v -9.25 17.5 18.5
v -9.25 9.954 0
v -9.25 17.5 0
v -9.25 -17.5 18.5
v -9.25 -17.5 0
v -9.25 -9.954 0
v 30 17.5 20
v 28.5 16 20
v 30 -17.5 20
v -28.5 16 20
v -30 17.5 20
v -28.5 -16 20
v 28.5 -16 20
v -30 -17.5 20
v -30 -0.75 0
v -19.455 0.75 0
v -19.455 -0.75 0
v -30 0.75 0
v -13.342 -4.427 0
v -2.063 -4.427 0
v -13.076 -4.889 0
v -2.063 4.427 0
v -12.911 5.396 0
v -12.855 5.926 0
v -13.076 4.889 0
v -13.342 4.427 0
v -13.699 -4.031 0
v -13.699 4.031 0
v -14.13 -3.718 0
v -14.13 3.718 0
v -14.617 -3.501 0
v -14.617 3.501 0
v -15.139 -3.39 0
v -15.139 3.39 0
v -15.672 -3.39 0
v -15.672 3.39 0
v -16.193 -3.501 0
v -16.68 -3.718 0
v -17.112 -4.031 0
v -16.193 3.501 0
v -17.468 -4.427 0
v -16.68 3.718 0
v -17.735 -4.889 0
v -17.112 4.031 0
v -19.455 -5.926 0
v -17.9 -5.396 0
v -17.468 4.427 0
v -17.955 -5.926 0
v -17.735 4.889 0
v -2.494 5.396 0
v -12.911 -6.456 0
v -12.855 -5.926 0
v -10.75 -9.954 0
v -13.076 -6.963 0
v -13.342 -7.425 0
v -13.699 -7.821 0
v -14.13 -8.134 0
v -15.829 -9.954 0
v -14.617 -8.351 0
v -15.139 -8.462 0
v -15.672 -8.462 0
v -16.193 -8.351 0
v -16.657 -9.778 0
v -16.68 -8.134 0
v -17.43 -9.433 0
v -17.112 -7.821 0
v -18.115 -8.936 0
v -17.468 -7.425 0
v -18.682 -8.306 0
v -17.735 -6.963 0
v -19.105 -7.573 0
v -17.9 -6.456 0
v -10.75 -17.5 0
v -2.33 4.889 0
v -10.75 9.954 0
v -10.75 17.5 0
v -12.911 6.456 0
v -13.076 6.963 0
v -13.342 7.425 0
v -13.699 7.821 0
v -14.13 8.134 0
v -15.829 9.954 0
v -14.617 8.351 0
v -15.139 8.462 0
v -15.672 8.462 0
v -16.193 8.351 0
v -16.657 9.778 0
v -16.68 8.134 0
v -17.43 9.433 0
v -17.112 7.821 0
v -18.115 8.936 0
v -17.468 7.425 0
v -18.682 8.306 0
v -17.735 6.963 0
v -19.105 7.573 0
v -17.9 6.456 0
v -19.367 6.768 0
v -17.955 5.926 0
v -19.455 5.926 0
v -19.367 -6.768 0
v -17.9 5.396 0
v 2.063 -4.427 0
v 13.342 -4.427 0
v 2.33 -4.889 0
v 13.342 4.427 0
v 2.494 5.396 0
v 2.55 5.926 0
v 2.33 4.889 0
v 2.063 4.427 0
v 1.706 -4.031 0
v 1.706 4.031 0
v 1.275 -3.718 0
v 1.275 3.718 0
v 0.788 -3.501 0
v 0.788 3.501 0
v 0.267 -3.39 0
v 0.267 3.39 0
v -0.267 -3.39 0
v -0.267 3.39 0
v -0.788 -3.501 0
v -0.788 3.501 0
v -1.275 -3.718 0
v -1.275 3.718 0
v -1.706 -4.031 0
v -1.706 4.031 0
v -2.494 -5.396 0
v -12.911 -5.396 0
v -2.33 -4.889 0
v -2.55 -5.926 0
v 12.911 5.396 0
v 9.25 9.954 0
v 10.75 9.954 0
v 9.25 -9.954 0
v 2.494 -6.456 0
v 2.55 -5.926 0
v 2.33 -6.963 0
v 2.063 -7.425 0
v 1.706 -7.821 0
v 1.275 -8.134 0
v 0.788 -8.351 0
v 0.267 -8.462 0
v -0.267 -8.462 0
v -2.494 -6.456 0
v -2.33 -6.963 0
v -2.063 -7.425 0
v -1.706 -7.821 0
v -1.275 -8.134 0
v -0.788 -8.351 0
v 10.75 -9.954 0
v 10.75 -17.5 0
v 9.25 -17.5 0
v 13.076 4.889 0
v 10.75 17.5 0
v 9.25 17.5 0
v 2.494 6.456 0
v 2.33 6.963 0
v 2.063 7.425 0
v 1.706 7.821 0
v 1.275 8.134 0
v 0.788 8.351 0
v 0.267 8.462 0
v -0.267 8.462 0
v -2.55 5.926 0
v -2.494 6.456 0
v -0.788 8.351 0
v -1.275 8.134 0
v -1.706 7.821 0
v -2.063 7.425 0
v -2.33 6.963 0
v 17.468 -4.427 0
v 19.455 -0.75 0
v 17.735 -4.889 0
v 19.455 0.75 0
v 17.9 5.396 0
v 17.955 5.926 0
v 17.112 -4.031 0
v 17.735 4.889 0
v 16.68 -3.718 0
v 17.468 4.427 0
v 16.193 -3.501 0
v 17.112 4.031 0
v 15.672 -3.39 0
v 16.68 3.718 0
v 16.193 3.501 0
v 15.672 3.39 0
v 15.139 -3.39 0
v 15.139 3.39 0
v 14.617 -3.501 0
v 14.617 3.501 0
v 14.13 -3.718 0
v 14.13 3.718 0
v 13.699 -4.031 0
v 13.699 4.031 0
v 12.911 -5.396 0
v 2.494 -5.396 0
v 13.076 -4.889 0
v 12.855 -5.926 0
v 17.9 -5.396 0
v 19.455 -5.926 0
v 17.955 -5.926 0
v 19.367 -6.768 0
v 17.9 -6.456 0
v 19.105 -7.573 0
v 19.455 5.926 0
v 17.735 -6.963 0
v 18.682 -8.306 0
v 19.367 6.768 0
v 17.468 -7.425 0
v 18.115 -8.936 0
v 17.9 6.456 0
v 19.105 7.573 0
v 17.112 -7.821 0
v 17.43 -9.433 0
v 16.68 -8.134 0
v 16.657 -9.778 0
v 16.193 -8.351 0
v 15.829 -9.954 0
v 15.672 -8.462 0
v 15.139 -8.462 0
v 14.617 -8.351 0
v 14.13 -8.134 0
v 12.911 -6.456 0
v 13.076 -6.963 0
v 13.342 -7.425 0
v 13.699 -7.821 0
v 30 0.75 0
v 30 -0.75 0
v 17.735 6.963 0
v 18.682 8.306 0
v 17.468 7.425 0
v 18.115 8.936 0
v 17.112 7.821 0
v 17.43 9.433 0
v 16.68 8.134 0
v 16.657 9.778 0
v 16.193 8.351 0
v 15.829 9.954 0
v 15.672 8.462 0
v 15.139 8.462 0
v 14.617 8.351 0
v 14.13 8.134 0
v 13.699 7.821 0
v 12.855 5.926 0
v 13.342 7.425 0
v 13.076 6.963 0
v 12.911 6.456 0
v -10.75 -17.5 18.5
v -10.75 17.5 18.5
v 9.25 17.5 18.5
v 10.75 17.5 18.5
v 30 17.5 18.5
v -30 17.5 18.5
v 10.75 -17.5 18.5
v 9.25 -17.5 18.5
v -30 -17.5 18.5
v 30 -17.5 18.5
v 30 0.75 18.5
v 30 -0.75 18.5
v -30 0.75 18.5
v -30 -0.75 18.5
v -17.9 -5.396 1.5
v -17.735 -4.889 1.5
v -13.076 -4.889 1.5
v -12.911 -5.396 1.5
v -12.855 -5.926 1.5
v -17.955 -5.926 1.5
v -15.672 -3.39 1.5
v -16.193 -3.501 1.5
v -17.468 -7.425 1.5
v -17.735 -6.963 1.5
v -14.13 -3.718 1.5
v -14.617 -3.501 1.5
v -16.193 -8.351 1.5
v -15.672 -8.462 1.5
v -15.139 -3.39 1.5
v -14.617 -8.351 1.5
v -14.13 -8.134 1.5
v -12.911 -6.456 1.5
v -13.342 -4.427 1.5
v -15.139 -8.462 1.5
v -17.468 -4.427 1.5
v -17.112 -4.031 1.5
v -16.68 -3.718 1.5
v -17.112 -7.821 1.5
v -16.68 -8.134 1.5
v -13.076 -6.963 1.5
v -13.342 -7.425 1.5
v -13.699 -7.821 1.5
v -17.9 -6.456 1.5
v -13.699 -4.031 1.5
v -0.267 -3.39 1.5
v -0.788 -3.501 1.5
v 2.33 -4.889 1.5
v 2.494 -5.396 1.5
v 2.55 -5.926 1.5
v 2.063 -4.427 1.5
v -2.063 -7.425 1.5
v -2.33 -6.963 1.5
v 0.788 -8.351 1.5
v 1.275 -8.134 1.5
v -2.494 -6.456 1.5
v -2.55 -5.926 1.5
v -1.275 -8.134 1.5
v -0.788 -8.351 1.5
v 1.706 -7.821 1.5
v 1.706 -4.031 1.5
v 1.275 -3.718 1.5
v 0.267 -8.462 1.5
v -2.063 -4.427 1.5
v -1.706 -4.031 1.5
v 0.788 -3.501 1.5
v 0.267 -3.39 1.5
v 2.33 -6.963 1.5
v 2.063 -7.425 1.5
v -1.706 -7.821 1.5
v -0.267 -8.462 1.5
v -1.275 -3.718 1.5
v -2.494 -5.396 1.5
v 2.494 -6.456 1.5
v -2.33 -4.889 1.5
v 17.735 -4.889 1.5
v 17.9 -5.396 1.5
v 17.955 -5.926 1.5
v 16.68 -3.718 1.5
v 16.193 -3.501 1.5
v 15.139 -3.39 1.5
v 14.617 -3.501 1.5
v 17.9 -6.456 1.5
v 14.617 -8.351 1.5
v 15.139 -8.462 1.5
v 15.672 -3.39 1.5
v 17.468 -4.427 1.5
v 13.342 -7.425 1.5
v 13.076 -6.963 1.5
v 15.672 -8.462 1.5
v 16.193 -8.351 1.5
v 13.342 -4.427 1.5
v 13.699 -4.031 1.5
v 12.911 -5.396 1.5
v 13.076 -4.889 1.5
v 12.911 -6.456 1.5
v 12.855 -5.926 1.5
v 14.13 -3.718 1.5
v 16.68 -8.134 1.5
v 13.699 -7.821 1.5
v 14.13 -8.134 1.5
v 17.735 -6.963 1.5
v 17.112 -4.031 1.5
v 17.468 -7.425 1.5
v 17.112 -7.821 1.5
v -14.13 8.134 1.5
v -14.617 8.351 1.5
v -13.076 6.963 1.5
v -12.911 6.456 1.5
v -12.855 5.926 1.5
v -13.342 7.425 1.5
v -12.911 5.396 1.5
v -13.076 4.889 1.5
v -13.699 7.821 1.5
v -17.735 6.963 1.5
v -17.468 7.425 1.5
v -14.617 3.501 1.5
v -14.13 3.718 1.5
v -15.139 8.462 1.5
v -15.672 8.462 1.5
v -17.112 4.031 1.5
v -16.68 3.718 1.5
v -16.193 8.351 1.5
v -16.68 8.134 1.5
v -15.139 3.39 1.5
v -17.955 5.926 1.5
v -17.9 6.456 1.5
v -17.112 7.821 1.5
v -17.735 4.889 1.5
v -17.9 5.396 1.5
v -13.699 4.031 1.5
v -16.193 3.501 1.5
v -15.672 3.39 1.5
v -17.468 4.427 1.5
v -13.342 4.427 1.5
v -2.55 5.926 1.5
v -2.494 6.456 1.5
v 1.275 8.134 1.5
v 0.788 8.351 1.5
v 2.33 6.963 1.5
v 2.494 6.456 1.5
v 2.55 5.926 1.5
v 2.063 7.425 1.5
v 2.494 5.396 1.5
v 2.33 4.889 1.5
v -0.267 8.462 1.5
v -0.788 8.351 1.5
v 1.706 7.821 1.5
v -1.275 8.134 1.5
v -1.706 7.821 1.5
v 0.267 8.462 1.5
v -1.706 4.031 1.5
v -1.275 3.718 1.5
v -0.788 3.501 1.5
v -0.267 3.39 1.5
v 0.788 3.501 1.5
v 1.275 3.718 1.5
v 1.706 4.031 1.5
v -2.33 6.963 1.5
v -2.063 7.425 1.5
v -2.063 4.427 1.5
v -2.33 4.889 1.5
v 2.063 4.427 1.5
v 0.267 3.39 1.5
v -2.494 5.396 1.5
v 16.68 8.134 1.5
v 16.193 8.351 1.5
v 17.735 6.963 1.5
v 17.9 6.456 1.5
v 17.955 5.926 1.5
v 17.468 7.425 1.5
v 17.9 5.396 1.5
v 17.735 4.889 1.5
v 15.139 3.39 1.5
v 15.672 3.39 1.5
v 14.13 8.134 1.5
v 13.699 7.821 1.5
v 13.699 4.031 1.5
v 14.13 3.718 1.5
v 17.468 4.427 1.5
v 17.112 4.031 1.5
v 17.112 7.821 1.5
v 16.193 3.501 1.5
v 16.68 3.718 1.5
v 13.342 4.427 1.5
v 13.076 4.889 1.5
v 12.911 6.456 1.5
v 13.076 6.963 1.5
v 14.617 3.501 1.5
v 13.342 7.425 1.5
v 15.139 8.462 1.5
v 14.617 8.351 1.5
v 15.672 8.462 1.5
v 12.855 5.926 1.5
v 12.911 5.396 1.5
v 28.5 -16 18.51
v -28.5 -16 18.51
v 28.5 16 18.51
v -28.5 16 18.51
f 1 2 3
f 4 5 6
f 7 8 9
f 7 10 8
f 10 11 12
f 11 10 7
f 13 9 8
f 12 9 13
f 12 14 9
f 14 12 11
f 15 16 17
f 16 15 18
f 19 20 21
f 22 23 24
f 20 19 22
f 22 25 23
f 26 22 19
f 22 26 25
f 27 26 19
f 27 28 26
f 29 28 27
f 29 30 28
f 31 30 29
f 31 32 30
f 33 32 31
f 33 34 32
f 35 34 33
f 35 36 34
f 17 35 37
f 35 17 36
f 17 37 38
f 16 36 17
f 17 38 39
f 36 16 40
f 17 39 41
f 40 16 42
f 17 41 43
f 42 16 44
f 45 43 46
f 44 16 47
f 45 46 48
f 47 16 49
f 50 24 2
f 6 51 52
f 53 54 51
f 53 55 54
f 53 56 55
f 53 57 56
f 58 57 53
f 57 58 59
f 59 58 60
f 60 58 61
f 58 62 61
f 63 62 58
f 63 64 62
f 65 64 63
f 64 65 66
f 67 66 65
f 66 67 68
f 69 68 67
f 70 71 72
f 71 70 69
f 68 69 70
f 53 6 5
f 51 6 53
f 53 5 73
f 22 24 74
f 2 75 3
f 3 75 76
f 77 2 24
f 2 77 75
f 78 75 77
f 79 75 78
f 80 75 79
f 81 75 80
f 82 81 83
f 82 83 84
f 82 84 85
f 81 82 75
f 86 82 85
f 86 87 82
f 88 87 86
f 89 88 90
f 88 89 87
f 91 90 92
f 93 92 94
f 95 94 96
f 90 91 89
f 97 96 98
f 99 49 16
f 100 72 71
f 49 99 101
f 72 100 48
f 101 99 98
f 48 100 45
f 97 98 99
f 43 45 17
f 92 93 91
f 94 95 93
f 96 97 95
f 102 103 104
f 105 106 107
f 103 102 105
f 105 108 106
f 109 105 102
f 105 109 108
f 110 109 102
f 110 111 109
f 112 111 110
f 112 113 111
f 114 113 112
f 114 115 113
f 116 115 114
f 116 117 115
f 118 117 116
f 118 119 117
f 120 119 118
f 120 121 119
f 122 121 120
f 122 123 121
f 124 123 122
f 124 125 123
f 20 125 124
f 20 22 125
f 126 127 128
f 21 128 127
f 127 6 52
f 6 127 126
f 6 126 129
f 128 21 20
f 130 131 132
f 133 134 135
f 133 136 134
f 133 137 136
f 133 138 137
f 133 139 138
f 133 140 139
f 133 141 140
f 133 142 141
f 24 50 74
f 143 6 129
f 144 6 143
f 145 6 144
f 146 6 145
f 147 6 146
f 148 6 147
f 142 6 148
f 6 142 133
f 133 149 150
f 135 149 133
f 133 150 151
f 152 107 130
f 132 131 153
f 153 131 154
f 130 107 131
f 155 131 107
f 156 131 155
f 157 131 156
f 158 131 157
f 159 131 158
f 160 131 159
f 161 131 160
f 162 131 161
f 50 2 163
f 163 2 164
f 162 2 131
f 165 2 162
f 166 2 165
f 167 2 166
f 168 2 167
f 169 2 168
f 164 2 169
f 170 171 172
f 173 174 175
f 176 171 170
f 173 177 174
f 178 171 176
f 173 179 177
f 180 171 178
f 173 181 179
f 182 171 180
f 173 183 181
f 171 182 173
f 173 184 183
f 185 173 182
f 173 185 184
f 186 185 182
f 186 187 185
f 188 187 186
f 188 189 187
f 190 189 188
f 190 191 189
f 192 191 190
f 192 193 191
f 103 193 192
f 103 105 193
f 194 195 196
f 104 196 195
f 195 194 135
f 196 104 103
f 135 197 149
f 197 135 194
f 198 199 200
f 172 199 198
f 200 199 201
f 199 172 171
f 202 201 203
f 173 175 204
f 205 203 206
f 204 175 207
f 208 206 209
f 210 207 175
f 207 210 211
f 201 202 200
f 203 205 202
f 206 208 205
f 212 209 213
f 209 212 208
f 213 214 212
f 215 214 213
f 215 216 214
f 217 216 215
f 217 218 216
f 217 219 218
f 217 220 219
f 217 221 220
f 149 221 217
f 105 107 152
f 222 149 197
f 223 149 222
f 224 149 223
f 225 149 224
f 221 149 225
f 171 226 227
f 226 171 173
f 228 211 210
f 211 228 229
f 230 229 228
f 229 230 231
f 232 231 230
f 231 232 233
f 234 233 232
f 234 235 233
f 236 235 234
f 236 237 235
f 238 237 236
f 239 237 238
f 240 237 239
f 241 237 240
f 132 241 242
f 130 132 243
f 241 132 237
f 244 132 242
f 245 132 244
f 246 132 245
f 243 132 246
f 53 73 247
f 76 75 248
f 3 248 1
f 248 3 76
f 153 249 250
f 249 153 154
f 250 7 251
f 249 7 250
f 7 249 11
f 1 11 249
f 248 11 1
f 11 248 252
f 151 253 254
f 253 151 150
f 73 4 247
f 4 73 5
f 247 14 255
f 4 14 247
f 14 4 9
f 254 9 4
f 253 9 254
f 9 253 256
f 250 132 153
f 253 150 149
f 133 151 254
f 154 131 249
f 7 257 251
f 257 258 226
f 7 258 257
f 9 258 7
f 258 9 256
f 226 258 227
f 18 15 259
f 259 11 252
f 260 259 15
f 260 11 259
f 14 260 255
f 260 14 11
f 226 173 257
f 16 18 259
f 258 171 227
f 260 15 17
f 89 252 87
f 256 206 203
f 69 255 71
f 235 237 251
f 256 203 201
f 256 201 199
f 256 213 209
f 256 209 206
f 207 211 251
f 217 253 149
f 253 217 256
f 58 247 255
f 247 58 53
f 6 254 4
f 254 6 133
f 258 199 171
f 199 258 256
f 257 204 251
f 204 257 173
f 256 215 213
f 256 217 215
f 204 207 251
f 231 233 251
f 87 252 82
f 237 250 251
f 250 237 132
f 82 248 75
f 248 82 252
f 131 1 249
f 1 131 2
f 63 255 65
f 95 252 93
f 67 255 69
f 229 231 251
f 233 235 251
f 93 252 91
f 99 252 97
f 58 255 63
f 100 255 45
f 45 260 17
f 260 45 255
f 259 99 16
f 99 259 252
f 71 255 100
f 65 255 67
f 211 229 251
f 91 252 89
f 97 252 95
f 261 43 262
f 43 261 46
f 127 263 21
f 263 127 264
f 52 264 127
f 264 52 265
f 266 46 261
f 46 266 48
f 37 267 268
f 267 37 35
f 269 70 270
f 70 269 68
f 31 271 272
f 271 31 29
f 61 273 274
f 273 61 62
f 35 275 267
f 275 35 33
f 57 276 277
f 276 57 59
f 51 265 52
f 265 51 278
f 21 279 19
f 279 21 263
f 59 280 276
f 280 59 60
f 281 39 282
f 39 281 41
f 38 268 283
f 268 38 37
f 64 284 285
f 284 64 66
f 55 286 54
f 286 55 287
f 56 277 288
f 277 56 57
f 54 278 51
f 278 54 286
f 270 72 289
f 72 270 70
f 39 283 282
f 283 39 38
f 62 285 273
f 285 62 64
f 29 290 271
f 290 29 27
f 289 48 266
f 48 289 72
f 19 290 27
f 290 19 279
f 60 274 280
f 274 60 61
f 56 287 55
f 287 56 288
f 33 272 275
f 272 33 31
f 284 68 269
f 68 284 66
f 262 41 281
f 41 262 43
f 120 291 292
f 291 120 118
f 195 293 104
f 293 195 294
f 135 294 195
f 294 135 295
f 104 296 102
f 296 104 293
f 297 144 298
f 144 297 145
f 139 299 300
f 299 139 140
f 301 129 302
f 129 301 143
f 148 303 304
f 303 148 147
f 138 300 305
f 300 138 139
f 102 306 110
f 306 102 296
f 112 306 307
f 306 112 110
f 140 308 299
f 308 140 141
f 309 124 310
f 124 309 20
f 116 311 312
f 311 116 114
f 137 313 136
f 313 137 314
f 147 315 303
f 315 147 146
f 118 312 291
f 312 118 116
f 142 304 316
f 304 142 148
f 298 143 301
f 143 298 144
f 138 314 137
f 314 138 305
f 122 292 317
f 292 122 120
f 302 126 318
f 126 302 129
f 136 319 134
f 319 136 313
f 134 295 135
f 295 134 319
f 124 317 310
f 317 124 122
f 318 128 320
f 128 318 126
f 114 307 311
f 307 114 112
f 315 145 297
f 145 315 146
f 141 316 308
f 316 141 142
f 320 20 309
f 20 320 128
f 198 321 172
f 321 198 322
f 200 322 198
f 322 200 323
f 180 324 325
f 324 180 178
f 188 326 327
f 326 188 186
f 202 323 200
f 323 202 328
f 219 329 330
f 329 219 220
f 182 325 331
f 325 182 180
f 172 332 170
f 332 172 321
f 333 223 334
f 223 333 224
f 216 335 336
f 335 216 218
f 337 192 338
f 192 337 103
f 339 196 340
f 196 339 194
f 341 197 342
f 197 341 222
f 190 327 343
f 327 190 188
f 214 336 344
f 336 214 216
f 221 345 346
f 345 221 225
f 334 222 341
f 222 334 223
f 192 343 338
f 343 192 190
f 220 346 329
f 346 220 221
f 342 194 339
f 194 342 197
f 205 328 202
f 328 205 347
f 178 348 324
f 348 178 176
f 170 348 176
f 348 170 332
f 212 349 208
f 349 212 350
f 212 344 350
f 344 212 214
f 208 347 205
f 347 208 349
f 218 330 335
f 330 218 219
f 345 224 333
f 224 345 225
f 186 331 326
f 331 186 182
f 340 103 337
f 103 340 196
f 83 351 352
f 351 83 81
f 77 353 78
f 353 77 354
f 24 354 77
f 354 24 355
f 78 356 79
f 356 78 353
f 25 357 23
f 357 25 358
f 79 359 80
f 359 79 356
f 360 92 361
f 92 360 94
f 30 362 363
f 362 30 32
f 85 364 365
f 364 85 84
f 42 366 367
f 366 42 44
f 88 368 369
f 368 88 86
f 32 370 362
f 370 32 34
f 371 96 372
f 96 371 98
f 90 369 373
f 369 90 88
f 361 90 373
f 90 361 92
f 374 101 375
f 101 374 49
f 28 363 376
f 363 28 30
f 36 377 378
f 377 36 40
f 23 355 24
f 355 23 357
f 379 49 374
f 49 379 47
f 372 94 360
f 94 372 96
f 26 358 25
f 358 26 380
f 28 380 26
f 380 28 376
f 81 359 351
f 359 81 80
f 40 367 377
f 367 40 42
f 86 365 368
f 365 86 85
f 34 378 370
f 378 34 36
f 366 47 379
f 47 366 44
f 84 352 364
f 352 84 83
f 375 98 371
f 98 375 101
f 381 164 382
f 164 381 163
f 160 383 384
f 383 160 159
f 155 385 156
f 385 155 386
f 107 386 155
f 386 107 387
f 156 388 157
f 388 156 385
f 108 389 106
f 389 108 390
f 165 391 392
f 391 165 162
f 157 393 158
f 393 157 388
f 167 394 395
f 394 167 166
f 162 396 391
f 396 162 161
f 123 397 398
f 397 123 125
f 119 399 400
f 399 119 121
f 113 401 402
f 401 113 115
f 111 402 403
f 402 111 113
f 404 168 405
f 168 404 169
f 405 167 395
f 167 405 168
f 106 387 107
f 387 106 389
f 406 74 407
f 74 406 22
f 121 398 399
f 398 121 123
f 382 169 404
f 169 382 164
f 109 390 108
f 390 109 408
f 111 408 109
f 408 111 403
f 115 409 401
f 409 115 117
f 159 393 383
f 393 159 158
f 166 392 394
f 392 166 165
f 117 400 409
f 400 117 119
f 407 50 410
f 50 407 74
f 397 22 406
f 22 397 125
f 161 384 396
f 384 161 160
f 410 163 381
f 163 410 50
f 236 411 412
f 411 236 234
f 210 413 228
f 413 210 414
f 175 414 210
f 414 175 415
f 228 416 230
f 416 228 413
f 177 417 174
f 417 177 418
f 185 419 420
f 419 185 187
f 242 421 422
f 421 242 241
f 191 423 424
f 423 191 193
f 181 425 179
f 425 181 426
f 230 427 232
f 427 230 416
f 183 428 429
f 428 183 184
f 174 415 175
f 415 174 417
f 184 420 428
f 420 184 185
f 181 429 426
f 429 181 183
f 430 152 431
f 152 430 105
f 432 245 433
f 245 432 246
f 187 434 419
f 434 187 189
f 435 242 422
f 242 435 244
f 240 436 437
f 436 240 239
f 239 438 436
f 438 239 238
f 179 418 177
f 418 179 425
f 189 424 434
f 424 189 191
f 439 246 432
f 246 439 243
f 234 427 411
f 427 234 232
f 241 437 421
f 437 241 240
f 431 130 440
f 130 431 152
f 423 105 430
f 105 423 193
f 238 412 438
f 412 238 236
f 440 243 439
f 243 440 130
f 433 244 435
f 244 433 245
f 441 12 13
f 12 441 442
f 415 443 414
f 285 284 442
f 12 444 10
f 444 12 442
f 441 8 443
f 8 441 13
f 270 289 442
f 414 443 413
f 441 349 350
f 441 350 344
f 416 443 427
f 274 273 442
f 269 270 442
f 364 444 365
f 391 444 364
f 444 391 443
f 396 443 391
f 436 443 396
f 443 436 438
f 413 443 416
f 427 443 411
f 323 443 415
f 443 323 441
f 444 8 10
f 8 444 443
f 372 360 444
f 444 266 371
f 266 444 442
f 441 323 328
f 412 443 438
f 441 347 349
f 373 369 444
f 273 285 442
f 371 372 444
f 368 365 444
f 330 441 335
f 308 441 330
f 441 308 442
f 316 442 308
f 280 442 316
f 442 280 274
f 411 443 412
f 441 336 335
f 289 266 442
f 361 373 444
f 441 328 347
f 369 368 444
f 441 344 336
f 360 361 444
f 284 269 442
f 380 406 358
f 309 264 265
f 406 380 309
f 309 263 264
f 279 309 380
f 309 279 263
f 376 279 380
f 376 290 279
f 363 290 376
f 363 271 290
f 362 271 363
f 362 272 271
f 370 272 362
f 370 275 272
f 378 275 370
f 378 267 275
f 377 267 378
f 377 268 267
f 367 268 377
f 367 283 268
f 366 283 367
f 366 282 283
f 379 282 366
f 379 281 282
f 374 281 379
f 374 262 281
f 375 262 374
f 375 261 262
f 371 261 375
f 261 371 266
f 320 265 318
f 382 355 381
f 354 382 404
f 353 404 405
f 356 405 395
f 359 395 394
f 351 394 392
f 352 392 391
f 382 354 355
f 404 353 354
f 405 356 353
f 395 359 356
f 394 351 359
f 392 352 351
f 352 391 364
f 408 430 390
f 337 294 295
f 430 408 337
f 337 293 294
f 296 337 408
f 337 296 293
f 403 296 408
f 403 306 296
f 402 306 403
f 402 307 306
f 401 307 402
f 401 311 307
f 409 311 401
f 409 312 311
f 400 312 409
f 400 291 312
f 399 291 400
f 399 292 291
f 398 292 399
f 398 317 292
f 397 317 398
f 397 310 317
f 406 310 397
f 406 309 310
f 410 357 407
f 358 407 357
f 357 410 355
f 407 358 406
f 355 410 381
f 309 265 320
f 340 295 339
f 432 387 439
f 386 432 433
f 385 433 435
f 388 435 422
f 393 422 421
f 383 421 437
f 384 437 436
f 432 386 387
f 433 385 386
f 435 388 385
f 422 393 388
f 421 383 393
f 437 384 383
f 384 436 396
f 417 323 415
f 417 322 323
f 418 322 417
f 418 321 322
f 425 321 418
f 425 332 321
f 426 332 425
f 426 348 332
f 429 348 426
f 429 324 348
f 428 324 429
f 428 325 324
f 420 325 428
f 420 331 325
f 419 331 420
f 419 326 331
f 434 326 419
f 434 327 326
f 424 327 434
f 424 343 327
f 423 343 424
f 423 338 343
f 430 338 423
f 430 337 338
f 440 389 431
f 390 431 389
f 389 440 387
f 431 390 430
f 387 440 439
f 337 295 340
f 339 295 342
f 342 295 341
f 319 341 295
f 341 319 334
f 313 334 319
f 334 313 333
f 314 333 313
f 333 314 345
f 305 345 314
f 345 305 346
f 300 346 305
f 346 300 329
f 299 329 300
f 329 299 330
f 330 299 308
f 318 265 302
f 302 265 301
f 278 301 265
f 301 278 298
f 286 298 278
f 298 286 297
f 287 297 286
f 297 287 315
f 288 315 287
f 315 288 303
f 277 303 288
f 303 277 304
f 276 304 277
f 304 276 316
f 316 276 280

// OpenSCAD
// Template to build a Display with printed SoftBoxes and std. LEDs
// by Jochen Krapf
// Version 1.01

// preview[view:south east, tilt:top diagonal]

/* [Global] */

// To render the parts choose the correcponding Part Name

Part = "Box";   // [Box:SoftBox,Spacer:Spacer grid for mounting,Test:Test]

// Parameters

// Diameter of a single LED in mm
LED_Diameter = 5.1;

// Count of LEDs at X direction
LEDs_X = 3;   // [1:10]

// Count of LEDs at Y direction
LEDs_Y = 2;   // [1:10]

// Mounting Depth in mm
MountingDepth = 20;

// Size of box at X direction
BoxSize_X = 60;

// Size of box at Y direction
BoxSize_Y = 35;

// Wall Width in mm
WallWidth = 1.5;

// Distance of mounting grid fillets in mm (or zero for no grid)
MountingGrid = 20;

// Thick ends of fillets
//FilletSwell = 2;   // [0:None, 2:Small, 3:Medium, 4:Large]

/* [Hidden] */

// Level of Details - Set to 0.1 for export to stl
$fs = 0.2;

Wall = WallWidth;
LED_Distance_X = (BoxSize_X-2*Wall) / (LEDs_X+0.7);
LED_Distance_Y = (BoxSize_Y-2*Wall) / (LEDs_Y+0.7);
LED_FirstOffset_X = (LEDs_X-1) * LED_Distance_X / -2.0;
LED_FirstOffset_Y = (LEDs_Y-1) * LED_Distance_Y / -2.0;

// Modules

module BoxTemplate(x, y, h, d)
{
	
	hull()
	{
		translate([0,0,h-Wall/2])
				cube(size = [x,y,Wall], center = true);
		
		for ( iy = [0 : (LEDs_Y-1)] )
			for ( ix = [0 : (LEDs_X-1)] )
			{
				translate([LED_FirstOffset_X + ix*LED_Distance_X, LED_FirstOffset_Y + iy*LED_Distance_Y, 0])
					cylinder (d=d, h=Wall, center=false);
			}
	}
}

module Grid()
{
	fdx = (floor((BoxSize_X-Wall)/(MountingGrid))-1) * MountingGrid / 2.0;
	fdy = (floor((BoxSize_Y-Wall)/(MountingGrid))-1) * MountingGrid / 2.0;

	if (MountingGrid>0)
		{
		for ( iy = [-fdy : MountingGrid : fdy+0.01] )
			translate([0, iy, MountingDepth/2])
				cube(size = [BoxSize_X, Wall, MountingDepth], center = true);
		for ( ix = [-fdx : MountingGrid : fdx+0.01] )
			translate([ix, 0, MountingDepth/2])
				cube(size = [Wall, BoxSize_Y, MountingDepth], center = true);
		}
}

module SoftBox()
{
	difference()
	{
		color( [1, 0.8, 0, 1] )
		union()
		{
			// outside
			BoxTemplate(BoxSize_X, BoxSize_Y, MountingDepth, LED_Diameter+2*Wall);

			// grid
			Grid();
		}

		// drill inside
		color( [1, 1, 1, 1] )
		translate([0, 0, Wall])
			BoxTemplate(BoxSize_X-2*Wall, BoxSize_Y-2*Wall, MountingDepth-Wall+0.01, LED_Diameter);

		// drill LEDs
		for ( iy = [0 : (LEDs_Y-1)] )
			for ( ix = [0 : (LEDs_X-1)] )
			{
				translate([LED_FirstOffset_X + ix*LED_Distance_X, LED_FirstOffset_Y + iy*LED_Distance_Y, -Wall])
					#cylinder (d=LED_Diameter, h=3*Wall, center=false);
			}
	}
}

module Spacer()
{
	Grid();
}

// Use Modules

if (Part == "Box")
{
	SoftBox();
}

if (Part == "Spacer")
{
	Spacer();
}

if (Part == "Test")
{
	for ( iy = [-3.5 : 3.5] )
		for ( ix = [-1 : 1] )
		{
			translate([ix*BoxSize_X, iy*BoxSize_Y, 0])
				SoftBox();
		}
}
